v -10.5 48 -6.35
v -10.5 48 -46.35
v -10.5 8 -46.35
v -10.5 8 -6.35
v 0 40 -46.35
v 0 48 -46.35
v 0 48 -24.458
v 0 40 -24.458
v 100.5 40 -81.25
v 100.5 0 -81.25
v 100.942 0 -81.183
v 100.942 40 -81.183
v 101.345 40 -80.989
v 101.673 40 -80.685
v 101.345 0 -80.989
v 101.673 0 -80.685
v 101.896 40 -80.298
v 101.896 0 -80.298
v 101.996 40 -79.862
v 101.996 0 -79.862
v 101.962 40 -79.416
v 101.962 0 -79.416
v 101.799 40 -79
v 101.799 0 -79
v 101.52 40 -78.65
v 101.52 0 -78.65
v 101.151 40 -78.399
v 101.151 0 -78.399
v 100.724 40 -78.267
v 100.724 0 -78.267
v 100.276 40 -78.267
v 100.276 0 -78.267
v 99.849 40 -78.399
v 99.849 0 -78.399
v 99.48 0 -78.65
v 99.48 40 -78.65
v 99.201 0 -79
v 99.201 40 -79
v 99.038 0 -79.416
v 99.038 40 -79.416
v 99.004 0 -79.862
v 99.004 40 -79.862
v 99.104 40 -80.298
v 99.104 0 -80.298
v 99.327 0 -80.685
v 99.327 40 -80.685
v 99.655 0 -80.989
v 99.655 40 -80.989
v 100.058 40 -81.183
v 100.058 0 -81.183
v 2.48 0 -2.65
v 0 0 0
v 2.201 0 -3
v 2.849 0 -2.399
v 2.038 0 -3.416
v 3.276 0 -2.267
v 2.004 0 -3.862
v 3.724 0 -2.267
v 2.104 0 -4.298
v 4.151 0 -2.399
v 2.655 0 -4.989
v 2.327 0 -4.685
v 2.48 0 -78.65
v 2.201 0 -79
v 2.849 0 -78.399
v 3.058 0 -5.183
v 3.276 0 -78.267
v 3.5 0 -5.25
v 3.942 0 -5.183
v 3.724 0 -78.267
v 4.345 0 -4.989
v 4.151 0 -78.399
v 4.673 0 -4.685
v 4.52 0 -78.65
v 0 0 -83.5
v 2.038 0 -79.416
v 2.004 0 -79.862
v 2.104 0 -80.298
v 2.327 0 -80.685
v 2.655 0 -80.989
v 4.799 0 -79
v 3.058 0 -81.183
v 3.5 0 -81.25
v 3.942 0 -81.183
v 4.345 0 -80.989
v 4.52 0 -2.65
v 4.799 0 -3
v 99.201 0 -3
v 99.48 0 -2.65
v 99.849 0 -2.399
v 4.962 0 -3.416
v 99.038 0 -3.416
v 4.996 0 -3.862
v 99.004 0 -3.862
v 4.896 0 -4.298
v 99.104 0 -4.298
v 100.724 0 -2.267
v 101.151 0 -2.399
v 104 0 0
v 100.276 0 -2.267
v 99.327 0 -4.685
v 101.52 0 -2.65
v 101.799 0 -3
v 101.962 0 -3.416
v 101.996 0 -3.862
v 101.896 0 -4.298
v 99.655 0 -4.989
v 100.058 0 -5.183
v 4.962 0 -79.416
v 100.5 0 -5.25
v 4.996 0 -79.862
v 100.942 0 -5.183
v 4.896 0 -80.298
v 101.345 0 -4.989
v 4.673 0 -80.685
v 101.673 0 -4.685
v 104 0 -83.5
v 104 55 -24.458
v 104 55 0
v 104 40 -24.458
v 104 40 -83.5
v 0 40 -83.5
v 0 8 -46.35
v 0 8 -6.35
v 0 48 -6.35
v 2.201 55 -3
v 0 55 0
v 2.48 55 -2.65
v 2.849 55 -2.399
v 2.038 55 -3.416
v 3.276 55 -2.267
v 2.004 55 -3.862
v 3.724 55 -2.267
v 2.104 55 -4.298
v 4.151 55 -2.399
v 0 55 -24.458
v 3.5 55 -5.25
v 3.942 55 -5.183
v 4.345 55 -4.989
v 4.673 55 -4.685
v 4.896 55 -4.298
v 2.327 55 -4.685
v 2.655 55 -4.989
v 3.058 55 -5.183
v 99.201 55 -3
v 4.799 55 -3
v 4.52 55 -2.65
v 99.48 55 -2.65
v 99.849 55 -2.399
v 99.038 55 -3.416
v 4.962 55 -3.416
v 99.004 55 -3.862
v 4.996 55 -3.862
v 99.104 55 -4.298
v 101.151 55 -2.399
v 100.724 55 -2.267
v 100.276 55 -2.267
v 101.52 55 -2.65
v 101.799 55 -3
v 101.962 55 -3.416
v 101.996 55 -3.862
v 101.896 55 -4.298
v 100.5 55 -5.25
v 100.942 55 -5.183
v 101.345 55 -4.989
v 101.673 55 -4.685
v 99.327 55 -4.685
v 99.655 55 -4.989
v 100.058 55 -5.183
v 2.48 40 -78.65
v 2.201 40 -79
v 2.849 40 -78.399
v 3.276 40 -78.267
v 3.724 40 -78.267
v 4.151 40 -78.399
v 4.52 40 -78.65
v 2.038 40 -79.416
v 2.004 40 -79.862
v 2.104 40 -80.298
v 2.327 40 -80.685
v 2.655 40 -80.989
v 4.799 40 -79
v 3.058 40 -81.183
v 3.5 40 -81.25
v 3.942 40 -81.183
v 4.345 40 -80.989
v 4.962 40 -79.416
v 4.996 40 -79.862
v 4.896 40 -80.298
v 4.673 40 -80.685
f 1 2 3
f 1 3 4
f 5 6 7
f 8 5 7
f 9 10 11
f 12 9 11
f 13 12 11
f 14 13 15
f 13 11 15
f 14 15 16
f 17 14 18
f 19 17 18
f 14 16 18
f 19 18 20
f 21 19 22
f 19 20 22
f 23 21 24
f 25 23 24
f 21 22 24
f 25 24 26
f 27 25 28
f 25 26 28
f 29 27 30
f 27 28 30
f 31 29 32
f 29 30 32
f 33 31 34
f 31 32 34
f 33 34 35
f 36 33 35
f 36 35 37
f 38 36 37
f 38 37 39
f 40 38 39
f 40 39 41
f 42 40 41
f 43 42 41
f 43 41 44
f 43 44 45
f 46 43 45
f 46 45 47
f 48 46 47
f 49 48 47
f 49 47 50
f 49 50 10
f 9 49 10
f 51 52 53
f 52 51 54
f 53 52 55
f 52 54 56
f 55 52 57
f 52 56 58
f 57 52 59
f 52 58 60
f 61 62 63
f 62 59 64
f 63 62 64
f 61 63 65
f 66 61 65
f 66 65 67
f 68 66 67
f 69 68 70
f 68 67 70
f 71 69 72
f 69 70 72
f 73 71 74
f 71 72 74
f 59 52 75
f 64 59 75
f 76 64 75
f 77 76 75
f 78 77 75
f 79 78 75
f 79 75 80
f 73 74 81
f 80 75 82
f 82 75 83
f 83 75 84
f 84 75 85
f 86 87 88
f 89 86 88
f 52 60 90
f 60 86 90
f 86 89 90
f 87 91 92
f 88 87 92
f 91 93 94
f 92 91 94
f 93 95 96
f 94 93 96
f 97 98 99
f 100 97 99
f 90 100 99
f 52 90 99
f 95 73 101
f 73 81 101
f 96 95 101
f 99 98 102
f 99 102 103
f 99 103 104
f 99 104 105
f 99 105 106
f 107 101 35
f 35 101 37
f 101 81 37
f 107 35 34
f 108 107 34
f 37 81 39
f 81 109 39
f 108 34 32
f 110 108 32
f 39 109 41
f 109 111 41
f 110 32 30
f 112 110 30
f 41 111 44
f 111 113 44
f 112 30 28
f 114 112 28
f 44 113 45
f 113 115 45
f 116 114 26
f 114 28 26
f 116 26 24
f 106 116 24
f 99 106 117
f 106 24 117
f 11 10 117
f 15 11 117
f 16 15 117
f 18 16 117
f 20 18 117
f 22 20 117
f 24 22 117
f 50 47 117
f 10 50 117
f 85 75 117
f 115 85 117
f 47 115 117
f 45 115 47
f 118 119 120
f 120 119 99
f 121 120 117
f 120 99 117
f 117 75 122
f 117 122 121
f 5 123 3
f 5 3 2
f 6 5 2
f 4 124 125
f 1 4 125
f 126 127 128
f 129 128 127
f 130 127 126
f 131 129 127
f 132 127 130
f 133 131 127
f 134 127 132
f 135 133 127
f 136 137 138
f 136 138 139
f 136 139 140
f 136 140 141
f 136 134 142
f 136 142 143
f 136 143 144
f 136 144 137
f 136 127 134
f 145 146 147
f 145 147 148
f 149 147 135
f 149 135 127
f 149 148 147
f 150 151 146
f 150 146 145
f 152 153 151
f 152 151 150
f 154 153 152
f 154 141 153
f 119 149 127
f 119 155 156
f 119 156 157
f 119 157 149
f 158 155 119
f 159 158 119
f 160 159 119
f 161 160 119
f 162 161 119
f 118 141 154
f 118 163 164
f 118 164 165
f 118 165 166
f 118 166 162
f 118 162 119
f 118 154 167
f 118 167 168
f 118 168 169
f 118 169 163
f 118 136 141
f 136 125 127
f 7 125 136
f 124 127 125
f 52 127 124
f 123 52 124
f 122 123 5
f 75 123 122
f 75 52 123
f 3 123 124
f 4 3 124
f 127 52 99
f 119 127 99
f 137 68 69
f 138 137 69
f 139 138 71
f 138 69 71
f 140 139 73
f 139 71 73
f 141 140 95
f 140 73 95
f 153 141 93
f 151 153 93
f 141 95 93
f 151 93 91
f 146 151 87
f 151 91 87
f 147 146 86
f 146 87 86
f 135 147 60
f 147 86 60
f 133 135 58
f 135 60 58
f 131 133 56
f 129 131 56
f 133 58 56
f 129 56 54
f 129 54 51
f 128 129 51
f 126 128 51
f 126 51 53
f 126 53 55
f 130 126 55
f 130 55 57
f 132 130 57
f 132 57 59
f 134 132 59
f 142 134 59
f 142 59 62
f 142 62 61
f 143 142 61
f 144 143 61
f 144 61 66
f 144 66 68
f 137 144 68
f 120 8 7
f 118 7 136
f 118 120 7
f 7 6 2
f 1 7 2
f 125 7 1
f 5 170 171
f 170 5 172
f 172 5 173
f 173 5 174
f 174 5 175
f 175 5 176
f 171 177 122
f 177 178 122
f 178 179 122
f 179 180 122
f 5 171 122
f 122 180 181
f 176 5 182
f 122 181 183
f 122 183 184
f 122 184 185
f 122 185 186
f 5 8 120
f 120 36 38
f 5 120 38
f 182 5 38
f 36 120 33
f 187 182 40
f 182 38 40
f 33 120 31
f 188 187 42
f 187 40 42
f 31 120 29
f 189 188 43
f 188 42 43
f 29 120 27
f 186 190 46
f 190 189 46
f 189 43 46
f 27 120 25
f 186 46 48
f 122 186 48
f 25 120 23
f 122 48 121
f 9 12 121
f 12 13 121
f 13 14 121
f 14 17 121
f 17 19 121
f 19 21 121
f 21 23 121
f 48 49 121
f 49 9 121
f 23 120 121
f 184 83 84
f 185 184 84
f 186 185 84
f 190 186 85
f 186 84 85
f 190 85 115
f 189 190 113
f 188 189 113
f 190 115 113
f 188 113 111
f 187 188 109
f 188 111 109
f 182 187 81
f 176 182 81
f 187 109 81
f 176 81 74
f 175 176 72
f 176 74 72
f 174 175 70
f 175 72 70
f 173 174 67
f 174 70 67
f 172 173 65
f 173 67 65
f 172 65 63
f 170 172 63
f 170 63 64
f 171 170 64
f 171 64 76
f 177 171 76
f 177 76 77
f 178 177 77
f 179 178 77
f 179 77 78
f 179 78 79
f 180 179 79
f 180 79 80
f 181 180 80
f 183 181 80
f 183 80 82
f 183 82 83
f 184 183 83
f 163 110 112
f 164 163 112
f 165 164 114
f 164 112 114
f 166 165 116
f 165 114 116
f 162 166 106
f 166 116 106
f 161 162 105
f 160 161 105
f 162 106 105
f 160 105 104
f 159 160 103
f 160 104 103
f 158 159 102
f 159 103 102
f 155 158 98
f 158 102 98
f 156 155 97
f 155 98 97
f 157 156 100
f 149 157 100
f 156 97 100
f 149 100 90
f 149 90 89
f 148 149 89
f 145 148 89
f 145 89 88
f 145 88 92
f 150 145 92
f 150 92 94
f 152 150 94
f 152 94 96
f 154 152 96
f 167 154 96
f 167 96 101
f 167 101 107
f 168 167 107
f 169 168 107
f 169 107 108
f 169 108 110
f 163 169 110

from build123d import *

# Parameters (mm, degrees)
SKETCH1_W           = 104
SKETCH1_H           = 83.5
BOSS_EXTRUDE1_DEPTH = 55
SKETCH2_W           = 59.042208754
SKETCH2_H           = 15
CUT_EXTRUDE1_DEPTH  = 145.267979815
SKETCH3_R           = 1.5
CUT_EXTRUDE2_DEPTH  = 145.267979815
SKETCH4_W           = 40
SKETCH4_H           = 40
BOSS_EXTRUDE2_DEPTH = 10.5


with BuildPart() as part:
    # Sketch1 → Boss-Extrude1 (new body)
    with BuildSketch(Plane(origin=(0, 0, 0), x_dir=(1, 0, 0), z_dir=(0, 1, 0))):
        with Locations((52, 41.75)):
            Rectangle(SKETCH1_W, SKETCH1_H)
    extrude(amount=BOSS_EXTRUDE1_DEPTH)

    # Sketch2 → Cut-Extrude1 (cut, through all)
    with BuildSketch(Plane(origin=(104, 0, 0), x_dir=(0, 0, -1), z_dir=(1, 0, 0))):
        with Locations((53.978895623, 47.5)):
            Rectangle(SKETCH2_W, SKETCH2_H)
    extrude(amount=-CUT_EXTRUDE1_DEPTH, mode=Mode.SUBTRACT)

    # Sketch3 → Cut-Extrude2 (cut, through all)
    with BuildSketch(Plane.XZ):
        with Locations(Location((3.5, -79.75, 0), (0, 0, 270))):
            Circle(SKETCH3_R)
        with Locations(Location((3.5, -3.75, 0), (0, 0, 270))):
            Circle(SKETCH3_R)
        with Locations(Location((100.5, -3.75, 0), (0, 0, 270))):
            Circle(SKETCH3_R)
        with Locations(Location((100.5, -79.75, 0), (0, 0, 270))):
            Circle(SKETCH3_R)
    extrude(amount=-CUT_EXTRUDE2_DEPTH, mode=Mode.SUBTRACT)

    # Sketch4 → Boss-Extrude2 (add)
    with BuildSketch(Plane.ZY):
        with Locations((-26.35, 28)):
            Rectangle(SKETCH4_W, SKETCH4_H)
    extrude(amount=BOSS_EXTRUDE2_DEPTH)


solid = part.part
